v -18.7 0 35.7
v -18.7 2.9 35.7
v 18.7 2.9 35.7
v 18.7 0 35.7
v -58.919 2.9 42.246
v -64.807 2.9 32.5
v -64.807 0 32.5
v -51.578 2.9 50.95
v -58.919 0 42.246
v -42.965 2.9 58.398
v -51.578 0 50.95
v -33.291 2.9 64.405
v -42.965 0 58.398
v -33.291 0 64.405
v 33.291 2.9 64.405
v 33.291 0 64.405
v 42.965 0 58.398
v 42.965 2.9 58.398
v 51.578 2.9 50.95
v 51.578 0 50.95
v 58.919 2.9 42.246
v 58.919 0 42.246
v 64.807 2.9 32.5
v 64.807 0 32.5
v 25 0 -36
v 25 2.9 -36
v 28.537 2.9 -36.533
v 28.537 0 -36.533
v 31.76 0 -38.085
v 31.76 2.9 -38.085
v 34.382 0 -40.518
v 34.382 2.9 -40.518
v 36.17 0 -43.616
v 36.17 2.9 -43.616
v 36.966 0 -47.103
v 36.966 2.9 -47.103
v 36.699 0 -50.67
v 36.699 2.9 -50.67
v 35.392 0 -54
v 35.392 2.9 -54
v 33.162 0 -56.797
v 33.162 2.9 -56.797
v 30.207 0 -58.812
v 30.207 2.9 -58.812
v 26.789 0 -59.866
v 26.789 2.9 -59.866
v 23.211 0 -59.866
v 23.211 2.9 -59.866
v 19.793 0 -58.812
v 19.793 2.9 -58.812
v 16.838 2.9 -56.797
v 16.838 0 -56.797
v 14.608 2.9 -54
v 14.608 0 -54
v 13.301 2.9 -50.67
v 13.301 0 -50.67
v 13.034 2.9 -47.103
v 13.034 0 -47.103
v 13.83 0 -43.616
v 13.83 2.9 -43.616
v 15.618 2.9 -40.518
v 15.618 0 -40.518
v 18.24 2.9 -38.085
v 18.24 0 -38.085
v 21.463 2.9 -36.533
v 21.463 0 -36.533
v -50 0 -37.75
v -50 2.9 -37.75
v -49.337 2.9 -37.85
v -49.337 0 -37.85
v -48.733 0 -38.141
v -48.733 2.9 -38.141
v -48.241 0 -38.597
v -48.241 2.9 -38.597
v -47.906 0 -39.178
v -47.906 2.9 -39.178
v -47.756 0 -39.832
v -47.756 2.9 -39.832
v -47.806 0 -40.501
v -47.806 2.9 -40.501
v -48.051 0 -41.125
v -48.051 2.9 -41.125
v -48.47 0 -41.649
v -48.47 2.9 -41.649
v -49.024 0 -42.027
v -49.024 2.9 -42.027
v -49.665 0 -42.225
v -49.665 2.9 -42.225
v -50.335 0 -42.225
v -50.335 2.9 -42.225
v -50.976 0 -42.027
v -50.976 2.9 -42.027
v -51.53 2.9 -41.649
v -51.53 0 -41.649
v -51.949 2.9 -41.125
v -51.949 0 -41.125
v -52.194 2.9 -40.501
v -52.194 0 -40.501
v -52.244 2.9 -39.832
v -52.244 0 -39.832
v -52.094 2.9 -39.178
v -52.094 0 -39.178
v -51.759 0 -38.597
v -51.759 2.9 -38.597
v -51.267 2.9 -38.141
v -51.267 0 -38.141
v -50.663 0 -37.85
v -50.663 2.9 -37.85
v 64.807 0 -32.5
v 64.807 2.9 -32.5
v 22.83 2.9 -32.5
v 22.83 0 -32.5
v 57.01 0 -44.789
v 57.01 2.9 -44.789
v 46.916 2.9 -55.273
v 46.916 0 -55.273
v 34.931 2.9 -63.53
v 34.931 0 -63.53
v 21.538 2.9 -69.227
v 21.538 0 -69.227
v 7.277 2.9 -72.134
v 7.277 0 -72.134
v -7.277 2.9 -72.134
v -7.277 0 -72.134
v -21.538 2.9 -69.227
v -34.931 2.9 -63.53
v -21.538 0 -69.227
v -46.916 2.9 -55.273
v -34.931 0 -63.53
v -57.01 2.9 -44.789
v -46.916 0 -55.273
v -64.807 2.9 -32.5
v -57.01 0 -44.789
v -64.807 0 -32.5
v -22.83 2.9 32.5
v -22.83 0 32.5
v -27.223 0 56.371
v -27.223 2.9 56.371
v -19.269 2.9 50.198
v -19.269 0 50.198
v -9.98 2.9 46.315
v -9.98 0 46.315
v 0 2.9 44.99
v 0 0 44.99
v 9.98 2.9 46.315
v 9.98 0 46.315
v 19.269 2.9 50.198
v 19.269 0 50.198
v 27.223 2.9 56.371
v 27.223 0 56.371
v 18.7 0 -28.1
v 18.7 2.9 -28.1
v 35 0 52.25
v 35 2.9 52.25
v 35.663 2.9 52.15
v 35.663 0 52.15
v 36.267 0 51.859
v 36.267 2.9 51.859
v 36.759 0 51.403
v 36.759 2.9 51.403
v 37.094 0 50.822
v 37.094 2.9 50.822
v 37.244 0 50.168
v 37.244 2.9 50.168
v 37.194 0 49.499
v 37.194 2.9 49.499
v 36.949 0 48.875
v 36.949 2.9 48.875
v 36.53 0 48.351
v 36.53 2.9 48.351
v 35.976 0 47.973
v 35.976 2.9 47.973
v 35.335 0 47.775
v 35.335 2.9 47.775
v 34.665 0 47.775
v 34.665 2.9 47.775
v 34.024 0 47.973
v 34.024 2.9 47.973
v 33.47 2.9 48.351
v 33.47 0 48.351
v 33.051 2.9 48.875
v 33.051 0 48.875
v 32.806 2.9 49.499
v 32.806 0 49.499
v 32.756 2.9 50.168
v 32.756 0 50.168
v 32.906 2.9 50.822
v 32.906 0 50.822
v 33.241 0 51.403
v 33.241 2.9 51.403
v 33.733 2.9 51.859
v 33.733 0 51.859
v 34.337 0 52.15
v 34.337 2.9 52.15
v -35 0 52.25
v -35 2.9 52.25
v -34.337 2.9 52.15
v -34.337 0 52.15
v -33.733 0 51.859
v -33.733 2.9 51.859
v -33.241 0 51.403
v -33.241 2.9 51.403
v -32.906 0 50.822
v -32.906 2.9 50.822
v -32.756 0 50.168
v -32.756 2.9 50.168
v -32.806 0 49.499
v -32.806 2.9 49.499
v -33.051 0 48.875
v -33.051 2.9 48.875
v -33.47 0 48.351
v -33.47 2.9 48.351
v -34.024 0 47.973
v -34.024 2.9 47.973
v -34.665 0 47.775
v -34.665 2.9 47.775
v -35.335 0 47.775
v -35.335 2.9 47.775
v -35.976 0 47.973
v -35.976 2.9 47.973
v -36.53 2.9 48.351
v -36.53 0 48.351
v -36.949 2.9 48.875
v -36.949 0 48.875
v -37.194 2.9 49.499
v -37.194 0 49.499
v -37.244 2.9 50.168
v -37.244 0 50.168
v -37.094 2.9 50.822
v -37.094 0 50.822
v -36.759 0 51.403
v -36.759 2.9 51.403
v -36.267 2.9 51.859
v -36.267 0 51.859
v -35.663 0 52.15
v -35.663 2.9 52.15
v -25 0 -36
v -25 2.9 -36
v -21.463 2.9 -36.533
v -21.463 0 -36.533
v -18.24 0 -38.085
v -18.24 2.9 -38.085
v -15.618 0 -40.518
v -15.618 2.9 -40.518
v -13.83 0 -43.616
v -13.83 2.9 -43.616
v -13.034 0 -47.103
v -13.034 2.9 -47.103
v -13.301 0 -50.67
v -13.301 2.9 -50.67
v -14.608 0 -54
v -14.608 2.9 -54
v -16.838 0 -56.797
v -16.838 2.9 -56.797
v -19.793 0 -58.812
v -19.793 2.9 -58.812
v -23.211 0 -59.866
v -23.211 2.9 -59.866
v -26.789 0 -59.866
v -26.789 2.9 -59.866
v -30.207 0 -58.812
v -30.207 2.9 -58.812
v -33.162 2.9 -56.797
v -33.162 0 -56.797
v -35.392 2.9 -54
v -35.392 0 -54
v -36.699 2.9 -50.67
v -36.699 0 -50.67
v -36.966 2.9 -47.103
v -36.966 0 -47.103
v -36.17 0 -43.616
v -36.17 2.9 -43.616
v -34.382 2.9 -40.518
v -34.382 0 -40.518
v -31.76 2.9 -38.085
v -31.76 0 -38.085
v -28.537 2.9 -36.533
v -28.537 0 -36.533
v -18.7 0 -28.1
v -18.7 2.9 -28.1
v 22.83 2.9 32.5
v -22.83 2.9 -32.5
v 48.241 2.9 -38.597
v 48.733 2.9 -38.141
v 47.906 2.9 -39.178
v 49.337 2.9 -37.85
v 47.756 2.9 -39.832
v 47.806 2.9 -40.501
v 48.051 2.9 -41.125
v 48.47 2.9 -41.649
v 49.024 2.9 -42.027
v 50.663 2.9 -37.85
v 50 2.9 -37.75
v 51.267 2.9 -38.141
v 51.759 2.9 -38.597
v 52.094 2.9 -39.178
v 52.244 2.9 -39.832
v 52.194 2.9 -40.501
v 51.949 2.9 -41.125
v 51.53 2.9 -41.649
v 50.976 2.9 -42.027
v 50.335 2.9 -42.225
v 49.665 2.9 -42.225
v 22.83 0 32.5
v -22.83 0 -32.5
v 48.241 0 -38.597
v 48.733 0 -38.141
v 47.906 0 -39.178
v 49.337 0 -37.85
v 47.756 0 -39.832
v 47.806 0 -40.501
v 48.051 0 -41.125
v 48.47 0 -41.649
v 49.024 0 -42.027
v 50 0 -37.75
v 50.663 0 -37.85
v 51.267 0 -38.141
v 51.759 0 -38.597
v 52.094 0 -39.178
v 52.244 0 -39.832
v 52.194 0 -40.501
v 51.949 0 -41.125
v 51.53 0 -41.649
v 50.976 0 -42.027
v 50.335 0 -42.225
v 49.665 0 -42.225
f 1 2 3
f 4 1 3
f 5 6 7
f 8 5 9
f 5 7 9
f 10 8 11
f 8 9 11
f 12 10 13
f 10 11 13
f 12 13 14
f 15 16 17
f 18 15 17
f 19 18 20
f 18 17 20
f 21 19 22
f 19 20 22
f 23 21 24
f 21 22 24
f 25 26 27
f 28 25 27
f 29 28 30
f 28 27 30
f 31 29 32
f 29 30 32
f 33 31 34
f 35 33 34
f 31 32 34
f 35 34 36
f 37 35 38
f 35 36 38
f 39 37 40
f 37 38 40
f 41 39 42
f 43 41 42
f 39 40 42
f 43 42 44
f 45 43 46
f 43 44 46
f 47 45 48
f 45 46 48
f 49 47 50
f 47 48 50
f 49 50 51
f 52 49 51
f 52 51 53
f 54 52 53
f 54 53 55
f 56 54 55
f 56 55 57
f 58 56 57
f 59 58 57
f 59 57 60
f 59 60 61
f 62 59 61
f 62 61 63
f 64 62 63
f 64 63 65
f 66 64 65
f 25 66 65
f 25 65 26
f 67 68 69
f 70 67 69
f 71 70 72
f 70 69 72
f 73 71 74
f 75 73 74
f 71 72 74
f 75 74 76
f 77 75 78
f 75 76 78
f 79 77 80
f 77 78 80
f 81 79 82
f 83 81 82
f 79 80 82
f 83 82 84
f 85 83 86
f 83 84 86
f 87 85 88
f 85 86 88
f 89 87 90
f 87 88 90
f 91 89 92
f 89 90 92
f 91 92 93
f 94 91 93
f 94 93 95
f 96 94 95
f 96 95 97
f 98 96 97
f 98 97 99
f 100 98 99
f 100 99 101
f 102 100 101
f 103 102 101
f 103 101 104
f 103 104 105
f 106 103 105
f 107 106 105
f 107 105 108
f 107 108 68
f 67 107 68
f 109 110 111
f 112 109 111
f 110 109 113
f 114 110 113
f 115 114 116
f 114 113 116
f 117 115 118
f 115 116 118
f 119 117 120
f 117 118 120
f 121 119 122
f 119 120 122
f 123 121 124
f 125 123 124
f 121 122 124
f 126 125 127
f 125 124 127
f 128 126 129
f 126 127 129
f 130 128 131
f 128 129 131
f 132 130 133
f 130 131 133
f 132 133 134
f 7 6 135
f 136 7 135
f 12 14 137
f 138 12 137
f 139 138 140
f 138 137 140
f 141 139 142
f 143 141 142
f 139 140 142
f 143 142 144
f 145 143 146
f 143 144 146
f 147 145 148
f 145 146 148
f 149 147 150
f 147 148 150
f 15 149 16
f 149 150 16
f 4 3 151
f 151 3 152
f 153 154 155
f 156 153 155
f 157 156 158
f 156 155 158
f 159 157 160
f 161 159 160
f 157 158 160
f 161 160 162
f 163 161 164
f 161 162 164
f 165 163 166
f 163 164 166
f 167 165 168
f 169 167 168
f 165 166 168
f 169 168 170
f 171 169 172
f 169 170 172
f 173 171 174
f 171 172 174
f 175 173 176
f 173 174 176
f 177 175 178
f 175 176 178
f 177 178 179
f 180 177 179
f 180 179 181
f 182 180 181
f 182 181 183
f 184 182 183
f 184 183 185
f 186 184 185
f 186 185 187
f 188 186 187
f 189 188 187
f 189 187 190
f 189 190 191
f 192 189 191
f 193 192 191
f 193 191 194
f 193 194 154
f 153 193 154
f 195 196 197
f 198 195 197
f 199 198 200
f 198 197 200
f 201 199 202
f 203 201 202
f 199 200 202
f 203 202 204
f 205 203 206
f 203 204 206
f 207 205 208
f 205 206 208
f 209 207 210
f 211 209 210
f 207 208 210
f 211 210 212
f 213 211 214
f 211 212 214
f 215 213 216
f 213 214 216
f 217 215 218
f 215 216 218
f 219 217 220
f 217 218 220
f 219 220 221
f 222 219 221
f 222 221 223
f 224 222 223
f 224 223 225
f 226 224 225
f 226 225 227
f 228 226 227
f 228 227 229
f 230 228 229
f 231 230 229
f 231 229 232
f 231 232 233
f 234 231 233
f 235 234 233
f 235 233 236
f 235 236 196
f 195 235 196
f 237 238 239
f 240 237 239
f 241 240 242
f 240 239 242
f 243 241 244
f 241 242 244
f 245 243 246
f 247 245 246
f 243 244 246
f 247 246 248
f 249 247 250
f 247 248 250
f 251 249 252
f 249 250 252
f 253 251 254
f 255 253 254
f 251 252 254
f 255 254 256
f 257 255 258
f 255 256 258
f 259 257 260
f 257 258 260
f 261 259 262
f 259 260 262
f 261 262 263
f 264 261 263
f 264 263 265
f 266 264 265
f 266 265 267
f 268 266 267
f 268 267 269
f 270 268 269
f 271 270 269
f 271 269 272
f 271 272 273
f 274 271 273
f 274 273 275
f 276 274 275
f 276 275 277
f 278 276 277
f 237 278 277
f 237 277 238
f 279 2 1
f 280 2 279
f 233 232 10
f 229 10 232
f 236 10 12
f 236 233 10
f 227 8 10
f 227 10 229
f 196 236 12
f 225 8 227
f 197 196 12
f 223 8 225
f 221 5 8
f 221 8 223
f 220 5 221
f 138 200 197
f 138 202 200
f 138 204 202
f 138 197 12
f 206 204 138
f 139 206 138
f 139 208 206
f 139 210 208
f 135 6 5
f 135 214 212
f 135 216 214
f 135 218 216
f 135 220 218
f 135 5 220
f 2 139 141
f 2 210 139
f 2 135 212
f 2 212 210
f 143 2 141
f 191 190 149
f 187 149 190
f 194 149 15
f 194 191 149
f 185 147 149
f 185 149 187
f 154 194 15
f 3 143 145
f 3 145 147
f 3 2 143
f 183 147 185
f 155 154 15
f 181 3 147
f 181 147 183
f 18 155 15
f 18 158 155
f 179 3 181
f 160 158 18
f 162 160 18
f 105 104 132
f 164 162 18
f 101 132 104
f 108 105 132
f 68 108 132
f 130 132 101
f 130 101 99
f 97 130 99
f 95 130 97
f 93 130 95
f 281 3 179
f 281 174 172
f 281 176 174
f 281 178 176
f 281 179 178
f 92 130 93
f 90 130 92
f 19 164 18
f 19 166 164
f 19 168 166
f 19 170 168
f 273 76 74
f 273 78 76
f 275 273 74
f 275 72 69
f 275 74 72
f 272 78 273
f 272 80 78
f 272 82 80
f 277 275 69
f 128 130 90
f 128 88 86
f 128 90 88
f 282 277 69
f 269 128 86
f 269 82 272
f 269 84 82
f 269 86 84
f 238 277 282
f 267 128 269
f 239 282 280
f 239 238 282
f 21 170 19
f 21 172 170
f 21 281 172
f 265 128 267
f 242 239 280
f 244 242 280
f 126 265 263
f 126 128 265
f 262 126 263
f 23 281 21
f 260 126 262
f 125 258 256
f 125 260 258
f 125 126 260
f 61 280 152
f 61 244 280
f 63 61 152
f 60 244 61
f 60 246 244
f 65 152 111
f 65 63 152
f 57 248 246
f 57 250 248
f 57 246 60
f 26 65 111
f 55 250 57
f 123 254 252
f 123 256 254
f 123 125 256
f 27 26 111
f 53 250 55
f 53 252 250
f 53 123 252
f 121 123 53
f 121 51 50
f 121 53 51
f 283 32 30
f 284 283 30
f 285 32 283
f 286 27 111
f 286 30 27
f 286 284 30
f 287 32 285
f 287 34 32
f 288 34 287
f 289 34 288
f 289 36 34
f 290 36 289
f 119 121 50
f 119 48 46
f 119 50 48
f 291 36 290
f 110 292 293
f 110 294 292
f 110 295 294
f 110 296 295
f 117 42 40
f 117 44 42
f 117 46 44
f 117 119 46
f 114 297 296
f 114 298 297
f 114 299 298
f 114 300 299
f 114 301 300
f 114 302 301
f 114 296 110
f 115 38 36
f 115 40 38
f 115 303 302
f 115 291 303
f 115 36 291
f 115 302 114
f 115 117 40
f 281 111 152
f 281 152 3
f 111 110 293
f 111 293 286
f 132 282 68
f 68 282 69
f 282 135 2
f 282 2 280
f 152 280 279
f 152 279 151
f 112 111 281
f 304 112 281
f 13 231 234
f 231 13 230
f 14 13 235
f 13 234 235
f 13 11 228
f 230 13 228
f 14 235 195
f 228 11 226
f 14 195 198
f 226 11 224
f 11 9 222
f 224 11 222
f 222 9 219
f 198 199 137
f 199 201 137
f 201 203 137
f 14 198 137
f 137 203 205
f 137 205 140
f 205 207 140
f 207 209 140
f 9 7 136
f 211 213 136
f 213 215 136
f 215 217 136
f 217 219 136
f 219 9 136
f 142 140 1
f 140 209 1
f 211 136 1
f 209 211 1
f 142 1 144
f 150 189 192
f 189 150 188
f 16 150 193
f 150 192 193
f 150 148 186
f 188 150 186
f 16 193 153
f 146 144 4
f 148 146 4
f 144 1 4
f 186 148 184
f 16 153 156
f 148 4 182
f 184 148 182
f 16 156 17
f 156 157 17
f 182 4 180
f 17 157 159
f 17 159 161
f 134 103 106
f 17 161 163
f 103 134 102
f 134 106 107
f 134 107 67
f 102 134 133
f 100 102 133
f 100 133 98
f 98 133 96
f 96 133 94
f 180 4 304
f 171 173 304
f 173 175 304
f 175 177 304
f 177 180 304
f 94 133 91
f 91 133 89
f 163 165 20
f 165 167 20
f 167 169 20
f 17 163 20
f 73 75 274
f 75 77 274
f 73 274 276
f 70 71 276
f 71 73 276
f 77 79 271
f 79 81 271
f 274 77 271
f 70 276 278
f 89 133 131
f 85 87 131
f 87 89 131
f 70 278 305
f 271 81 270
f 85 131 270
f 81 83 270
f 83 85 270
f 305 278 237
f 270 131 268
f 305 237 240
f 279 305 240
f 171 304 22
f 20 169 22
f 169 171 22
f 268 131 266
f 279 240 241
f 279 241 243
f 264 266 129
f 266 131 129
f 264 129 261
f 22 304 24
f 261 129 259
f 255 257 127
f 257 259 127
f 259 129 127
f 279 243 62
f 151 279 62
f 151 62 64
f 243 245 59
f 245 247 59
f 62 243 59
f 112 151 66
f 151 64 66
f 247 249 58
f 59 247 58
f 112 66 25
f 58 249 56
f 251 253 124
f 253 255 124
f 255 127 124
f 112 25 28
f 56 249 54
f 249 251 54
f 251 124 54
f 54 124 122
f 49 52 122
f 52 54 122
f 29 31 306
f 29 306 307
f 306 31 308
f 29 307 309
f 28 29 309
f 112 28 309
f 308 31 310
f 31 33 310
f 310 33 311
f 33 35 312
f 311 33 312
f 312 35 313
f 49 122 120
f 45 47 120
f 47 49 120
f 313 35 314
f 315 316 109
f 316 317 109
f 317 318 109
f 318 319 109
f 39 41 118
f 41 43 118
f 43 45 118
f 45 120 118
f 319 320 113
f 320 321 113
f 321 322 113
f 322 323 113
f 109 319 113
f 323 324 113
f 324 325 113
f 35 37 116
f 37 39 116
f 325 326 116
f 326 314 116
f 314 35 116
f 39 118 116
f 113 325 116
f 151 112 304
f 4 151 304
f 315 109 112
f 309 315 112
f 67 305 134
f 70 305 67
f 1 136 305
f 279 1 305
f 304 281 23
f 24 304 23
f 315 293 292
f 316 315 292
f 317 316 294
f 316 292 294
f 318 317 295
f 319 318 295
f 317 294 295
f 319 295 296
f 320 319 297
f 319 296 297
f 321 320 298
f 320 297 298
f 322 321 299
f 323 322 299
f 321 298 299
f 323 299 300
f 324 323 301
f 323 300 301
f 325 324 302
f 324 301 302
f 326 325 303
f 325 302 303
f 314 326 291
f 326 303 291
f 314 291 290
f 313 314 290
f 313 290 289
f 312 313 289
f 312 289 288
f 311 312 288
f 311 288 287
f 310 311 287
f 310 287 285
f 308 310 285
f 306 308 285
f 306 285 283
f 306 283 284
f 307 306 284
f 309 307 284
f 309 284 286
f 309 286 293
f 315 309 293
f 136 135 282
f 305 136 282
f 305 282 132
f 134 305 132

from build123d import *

# Parameters (mm, degrees)
BOSS_EXTRUDE1_DEPTH  = 2.9
SOLENOID_PLACEMENT_W = 37.4
SOLENOID_PLACEMENT_H = 63.8
CUT_EXTRUDE1_DEPTH   = 103.571487266
CUT_EXTRUDE2_DEPTH   = 103.571487266
SKETCH3_R            = 12
CUT_EXTRUDE3_DEPTH   = 98.286484159
SKETCH4_R            = 2.25
CUT_EXTRUDE4_DEPTH   = 98.416066437


with BuildPart() as part:
    # Sketch1 → Boss-Extrude1 (new body)
    with BuildSketch(Plane(origin=(0, 0, 0), x_dir=(1, 0, 0), z_dir=(0, 1, 0))):
        with BuildLine():
            ThreePointArc((33.29110537, -64.404598464), (0, 72.5), (-33.29110537, -64.404598464))
            ThreePointArc((-33.29110537, -64.404598464), (0, -44.989799638), (33.29110537, -64.404598464))
        make_face()
    extrude(amount=BOSS_EXTRUDE1_DEPTH)

    # solenoid placement → Cut-Extrude1 (cut, through all)
    with BuildSketch(Plane(origin=(0, 2.9, 0), x_dir=(1, 0, 0), z_dir=(0, 1, 0))):
        with Locations((0, -3.8)):
            Rectangle(SOLENOID_PLACEMENT_W, SOLENOID_PLACEMENT_H)
    extrude(amount=-CUT_EXTRUDE1_DEPTH, mode=Mode.SUBTRACT)

    # Sketch2 → Cut-Extrude2 (cut, through all)
    with BuildSketch(Plane(origin=(0, 2.9, 0), x_dir=(1, 0, 0), z_dir=(0, 1, 0))):
        with BuildLine():
            Line((-34.63, -32.5), (-22.83, -32.5))
            Line((-22.83, -32.5), (-22.83, 32.5))
            Line((-22.83, 32.5), (-64.807406984, 32.5))
            ThreePointArc((-64.807406984, 32.5), (-72.5, 0), (-64.807406984, -32.5))
            Line((-64.807406984, -32.5), (-34.63, -32.5))
        make_face()
        with BuildLine():
            Line((34.63, -32.5), (64.807406984, -32.5))
            ThreePointArc((64.807406984, -32.5), (72.5, 0), (64.807406984, 32.5))
            Line((64.807406984, 32.5), (22.83, 32.5))
            Line((22.83, 32.5), (22.83, -32.5))
            Line((22.83, -32.5), (34.63, -32.5))
        make_face()
    extrude(amount=-CUT_EXTRUDE2_DEPTH, mode=Mode.SUBTRACT)

    # Sketch3 → Cut-Extrude3 (cut, through all)
    with BuildSketch(Plane(origin=(0, 2.9, 0), x_dir=(1, 0, 0), z_dir=(0, 1, 0))):
        with Locations(Location((25, 48, 0), (0, 0, 270))):
            Circle(SKETCH3_R)
        with Locations(Location((-25, 48, 0), (0, 0, 270))):
            Circle(SKETCH3_R)
    extrude(amount=-CUT_EXTRUDE3_DEPTH, mode=Mode.SUBTRACT)

    # Sketch4 → Cut-Extrude4 (cut, through all)
    with BuildSketch(Plane(origin=(0, 5.8, 0), x_dir=(1, 0, 0), z_dir=(0, 1, 0))):
        with Locations(Location((35, -50, 0), (0, 0, 270))):
            Circle(SKETCH4_R)
        with Locations(Location((-35, -50, 0), (0, 0, 270))):
            Circle(SKETCH4_R)
        with Locations(Location((-50, 40, 0), (0, 0, 270))):
            Circle(SKETCH4_R)
        with Locations(Location((50, 40, 0), (0, 0, 270))):
            Circle(SKETCH4_R)
    extrude(amount=-CUT_EXTRUDE4_DEPTH, mode=Mode.SUBTRACT)


solid = part.part
